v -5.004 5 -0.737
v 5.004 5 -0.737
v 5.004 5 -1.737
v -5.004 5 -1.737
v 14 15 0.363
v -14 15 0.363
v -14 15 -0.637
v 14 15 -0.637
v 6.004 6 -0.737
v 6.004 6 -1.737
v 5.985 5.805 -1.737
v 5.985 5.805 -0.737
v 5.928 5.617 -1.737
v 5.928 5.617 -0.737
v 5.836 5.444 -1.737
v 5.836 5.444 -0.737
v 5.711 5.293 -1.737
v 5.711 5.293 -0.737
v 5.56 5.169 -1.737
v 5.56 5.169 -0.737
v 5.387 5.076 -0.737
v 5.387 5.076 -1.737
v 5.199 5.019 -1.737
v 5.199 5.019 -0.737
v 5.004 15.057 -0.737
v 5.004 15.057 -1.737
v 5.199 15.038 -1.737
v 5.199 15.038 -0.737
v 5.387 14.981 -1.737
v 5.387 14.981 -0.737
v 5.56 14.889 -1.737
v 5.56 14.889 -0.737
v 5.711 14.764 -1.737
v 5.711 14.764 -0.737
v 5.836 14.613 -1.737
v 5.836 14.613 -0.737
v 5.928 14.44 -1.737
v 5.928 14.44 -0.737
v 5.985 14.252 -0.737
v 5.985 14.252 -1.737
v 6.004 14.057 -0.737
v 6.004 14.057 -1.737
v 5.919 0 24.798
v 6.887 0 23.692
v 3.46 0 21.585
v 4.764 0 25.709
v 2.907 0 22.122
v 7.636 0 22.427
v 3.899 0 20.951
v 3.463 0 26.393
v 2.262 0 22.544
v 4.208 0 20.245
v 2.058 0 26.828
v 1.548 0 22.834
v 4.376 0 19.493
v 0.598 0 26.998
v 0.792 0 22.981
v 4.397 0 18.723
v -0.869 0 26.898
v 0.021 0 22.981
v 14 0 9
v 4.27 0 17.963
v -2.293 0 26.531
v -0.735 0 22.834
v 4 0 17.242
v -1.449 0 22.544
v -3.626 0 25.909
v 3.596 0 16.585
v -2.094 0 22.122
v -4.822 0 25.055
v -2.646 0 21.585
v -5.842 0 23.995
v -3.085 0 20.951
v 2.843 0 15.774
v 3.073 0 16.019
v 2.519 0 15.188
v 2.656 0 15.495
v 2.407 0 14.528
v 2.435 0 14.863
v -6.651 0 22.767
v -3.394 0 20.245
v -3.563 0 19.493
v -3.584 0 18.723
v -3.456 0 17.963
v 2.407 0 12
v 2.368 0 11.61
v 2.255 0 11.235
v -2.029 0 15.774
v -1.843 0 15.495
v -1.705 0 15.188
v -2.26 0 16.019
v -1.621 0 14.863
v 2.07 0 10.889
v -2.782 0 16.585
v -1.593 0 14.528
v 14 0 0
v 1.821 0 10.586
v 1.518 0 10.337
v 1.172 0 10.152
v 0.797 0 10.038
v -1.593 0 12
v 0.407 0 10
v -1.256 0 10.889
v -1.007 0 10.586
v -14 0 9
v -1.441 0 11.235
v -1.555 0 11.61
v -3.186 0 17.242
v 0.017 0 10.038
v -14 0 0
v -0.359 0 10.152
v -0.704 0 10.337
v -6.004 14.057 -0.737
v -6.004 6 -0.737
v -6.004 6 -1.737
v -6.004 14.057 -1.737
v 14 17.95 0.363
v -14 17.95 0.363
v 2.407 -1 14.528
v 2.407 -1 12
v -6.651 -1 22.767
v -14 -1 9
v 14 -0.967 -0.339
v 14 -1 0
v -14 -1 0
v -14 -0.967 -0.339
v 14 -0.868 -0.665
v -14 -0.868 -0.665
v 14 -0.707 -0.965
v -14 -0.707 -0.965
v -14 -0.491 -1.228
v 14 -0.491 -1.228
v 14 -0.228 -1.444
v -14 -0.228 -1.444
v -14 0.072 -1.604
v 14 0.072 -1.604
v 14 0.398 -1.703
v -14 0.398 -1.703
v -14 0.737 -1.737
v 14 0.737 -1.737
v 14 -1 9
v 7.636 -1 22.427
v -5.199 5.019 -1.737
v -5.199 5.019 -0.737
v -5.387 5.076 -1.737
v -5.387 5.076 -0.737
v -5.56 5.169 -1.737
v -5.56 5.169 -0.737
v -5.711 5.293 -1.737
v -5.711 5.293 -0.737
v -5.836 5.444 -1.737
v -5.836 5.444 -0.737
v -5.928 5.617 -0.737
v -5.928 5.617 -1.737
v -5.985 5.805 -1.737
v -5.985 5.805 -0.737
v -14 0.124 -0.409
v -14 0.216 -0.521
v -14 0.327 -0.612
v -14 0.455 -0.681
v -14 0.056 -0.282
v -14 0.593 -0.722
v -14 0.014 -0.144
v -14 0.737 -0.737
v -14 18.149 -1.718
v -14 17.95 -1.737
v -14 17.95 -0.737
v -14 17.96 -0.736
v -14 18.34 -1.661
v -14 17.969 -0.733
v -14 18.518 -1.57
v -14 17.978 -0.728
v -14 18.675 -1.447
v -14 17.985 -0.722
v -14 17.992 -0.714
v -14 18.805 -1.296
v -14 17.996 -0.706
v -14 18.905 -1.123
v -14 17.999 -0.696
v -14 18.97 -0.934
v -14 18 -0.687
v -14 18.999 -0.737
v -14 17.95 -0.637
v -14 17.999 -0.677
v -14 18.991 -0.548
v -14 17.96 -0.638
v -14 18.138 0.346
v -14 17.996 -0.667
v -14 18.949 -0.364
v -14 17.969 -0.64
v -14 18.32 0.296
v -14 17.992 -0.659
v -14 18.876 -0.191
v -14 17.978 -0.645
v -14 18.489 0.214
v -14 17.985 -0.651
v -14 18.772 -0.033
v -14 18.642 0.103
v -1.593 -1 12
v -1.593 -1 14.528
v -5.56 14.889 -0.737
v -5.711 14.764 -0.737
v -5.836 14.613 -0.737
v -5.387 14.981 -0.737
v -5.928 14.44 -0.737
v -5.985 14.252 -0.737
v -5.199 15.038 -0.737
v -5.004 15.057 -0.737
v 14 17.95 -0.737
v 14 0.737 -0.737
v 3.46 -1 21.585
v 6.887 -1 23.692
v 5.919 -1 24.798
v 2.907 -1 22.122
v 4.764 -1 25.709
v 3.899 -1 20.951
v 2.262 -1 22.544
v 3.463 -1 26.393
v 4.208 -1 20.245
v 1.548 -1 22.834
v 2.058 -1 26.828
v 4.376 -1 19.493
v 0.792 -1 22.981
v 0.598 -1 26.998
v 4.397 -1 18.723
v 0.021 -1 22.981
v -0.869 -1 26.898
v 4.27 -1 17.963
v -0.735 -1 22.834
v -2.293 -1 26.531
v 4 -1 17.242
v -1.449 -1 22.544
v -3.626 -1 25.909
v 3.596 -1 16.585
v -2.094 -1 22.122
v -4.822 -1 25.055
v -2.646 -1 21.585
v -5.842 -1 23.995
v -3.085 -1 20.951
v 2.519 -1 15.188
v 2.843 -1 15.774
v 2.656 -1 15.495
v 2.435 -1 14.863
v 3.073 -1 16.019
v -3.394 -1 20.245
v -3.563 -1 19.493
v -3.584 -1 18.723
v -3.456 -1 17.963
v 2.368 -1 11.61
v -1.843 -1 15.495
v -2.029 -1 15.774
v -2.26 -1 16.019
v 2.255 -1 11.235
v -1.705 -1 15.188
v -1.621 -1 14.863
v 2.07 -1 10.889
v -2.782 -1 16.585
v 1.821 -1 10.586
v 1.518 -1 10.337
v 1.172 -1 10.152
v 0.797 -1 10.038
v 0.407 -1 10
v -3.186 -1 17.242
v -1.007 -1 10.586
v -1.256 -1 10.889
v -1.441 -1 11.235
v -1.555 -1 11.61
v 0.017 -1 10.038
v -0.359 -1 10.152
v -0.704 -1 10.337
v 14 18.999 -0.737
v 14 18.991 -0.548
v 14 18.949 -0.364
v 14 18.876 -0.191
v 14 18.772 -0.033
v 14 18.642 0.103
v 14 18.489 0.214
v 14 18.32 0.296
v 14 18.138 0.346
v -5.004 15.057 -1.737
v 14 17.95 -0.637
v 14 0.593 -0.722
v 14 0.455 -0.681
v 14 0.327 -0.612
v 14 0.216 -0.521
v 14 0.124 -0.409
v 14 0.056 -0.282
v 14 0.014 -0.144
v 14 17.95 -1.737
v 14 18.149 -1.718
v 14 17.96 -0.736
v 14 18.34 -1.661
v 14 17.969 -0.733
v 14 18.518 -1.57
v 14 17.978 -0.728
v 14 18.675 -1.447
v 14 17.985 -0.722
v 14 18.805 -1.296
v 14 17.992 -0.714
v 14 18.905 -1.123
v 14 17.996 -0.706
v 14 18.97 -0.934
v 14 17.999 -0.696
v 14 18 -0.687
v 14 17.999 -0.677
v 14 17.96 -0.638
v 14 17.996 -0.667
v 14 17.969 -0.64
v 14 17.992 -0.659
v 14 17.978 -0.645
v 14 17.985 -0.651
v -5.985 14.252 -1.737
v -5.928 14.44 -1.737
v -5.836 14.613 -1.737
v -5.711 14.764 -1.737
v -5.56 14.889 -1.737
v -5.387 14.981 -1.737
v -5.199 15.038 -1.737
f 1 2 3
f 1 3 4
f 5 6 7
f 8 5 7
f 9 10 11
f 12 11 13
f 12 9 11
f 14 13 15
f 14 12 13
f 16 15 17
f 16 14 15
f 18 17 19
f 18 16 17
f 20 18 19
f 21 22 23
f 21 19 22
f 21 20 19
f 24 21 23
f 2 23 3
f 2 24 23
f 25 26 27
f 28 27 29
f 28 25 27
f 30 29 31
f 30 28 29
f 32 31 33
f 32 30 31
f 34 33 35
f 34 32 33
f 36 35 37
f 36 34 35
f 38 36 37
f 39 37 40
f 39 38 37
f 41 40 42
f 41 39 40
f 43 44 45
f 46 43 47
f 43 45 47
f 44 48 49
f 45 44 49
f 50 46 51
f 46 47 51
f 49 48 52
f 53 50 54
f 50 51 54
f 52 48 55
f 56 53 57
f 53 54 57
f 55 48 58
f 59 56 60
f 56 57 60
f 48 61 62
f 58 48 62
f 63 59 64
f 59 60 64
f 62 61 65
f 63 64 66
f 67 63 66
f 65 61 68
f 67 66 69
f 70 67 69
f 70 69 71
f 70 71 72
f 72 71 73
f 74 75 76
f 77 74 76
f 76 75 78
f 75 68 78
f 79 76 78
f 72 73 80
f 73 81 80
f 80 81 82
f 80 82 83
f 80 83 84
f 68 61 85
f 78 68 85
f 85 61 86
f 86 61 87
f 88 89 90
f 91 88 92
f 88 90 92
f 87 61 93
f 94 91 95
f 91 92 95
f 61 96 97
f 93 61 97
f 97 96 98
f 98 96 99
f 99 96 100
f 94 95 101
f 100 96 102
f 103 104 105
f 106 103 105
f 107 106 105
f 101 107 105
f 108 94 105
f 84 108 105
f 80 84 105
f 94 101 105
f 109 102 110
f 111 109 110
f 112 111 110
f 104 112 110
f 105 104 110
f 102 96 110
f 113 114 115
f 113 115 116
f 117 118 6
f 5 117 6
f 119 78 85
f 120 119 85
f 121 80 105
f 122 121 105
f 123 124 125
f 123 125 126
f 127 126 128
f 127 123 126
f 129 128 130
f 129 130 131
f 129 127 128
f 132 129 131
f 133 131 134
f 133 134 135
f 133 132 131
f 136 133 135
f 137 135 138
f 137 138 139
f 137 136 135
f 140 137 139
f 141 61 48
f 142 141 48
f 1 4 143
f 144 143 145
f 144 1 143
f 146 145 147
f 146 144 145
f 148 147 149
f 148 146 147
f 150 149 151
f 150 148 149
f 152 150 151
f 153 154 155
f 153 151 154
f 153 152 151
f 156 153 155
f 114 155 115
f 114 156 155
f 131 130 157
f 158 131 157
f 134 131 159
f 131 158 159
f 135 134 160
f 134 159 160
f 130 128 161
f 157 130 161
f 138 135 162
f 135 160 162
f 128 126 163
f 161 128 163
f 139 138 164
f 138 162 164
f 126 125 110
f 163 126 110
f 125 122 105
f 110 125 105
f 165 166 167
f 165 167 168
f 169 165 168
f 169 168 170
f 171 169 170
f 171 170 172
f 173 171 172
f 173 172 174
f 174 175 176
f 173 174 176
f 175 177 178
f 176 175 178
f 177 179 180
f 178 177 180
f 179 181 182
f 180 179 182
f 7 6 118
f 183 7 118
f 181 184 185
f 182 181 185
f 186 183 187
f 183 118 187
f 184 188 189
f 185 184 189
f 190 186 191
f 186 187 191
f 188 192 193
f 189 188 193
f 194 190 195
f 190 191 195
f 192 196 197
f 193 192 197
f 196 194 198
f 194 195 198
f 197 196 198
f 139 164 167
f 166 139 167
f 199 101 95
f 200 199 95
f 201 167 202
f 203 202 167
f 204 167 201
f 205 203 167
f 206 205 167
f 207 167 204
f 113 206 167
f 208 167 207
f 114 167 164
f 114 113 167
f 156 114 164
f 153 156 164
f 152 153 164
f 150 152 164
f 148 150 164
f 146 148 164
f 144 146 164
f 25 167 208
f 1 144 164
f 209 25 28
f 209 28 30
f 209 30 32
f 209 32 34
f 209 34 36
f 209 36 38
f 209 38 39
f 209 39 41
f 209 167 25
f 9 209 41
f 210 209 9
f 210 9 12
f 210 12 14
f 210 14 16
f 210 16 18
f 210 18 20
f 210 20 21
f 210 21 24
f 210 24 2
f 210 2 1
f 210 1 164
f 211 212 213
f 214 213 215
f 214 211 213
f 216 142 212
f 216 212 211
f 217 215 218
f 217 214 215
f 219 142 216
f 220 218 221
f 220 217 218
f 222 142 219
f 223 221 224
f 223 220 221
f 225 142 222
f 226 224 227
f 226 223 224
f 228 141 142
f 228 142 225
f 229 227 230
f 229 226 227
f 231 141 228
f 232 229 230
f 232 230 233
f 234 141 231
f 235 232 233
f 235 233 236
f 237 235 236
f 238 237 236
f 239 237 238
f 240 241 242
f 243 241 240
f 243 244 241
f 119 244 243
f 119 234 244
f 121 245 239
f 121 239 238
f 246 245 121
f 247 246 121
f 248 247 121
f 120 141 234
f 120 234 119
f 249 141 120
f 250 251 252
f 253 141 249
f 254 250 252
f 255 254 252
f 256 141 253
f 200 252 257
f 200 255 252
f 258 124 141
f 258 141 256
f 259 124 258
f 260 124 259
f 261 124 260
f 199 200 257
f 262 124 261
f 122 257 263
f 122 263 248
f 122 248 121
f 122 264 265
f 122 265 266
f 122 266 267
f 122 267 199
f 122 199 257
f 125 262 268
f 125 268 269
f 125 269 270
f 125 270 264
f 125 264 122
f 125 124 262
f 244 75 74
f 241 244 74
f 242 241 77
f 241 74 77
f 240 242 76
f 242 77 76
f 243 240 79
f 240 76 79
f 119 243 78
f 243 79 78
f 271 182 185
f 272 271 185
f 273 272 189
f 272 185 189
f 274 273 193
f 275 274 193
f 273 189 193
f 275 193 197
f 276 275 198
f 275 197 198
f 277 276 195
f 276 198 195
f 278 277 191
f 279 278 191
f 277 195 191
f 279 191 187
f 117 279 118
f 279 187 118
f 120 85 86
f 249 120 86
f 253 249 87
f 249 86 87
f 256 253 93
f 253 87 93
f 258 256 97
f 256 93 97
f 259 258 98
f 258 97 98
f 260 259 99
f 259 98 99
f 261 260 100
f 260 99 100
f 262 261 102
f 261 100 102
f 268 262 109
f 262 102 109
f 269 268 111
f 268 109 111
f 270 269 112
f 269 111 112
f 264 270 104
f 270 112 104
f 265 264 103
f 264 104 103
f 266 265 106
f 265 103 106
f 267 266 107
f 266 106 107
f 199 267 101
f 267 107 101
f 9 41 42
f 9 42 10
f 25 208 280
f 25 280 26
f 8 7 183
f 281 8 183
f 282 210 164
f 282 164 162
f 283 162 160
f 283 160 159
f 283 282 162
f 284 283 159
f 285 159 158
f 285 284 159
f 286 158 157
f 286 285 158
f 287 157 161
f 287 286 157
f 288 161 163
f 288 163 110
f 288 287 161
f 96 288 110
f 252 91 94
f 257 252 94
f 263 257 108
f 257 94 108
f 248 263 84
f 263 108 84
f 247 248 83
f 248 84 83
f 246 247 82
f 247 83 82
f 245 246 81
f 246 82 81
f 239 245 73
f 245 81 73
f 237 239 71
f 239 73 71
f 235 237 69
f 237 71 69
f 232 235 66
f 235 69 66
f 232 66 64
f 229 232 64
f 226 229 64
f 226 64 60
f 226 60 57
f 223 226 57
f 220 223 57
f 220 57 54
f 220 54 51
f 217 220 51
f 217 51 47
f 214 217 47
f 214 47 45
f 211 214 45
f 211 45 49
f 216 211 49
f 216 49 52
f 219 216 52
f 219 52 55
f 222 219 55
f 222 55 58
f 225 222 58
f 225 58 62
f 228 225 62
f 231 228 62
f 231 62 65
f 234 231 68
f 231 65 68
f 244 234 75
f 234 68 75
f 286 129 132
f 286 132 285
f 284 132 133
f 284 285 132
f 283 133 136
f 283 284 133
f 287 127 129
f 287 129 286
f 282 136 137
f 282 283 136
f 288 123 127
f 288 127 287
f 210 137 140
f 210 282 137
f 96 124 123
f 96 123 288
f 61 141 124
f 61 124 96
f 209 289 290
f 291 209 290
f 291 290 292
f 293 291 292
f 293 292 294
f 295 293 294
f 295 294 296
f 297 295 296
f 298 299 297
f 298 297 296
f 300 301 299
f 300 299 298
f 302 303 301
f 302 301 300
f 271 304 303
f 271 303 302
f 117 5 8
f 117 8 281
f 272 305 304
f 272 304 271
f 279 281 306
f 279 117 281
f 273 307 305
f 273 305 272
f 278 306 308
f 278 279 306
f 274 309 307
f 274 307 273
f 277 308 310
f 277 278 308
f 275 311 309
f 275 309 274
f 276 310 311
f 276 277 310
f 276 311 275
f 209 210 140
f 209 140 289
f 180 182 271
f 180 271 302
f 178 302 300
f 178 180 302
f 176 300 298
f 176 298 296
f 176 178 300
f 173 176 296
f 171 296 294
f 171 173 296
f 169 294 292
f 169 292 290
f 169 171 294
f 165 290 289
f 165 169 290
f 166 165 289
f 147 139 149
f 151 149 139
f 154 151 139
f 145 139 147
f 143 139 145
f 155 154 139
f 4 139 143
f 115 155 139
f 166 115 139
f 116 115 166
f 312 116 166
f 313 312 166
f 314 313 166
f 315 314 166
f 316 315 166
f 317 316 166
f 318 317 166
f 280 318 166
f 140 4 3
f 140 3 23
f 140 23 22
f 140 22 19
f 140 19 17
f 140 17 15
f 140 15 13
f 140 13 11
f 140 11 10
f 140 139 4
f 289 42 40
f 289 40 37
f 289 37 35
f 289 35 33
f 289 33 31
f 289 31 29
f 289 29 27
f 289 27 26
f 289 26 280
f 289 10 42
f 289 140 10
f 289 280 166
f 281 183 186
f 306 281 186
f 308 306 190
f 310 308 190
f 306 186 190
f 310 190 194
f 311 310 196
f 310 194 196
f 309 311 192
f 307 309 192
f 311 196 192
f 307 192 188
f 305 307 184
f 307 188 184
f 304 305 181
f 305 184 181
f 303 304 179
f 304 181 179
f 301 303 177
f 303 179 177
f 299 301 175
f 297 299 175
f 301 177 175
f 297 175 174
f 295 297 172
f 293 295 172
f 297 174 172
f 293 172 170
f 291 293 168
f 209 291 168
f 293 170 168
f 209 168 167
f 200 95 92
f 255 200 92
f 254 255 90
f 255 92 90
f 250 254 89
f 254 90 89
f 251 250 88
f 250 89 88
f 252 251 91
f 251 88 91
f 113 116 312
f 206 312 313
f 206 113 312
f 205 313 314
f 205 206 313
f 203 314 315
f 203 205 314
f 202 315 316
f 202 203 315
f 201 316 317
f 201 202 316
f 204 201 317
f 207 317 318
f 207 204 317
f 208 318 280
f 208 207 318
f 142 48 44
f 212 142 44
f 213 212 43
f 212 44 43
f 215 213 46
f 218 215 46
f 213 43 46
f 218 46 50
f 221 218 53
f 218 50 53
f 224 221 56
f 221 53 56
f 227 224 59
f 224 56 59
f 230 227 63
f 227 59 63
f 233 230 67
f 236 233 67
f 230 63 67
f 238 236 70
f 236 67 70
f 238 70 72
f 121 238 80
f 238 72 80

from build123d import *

# Parameters (mm, degrees)
BASE_FLANGE1_DEPTH = 1
EDGE_FLANGE1_DEPTH = 28
HEM1_START         = -14
HEM1_DEPTH         = 28
HEM1_2_DEPTH       = 28
CUT_EXTRUDE1_DEPTH = 10
CUT_EXTRUDE3_DEPTH = 10


# Read off the part's stored shape, not the designer's step: Hem1
# Sheet-metal steps are written as plain solids
with BuildPart() as part:
    # Sketch1 → Base-Flange1 (new body)
    with BuildSketch(Plane(origin=(0, 0, 0), x_dir=(1, 0, 0), z_dir=(0, 1, 0))):
        with BuildLine():
            Line((-14, 0), (14, 0))
            Line((14, 0), (14, -9))
            Line((14, -9), (7.635806501, -22.426557457))
            ThreePointArc((7.635806501, -22.426557457), (0.597605148, -26.997723985), (-6.650589662, -22.767415048))
            Line((-6.650589662, -22.767415048), (-14, -9))
            Line((-14, -9), (-14, 0))
        make_face()
    extrude(amount=-BASE_FLANGE1_DEPTH)

    # Edge-Flange1 section (across the edge) → Edge-Flange1 (add)
    with BuildSketch(Plane(origin=(14, 0, -0.7366), x_dir=(0, 0, 1), z_dir=(-1, 0, 0))):
        with BuildLine():
            Line((-1, 0.7366), (-1, 19))
            Line((-1, 19), (0, 19))
            Line((0, 19), (0, 0.7366))
            ThreePointArc((0, 0.7366), (0.215745145, 0.215745145), (0.7366, 0))
            Line((0.7366, 0), (0.7366, -1))
            ThreePointArc((0.7366, -1), (-0.491361636, -0.491361636), (-1, 0.7366))
        make_face()
    extrude(amount=EDGE_FLANGE1_DEPTH)

    # Hem1 outline → Hem1 (cut)
    with BuildSketch(Plane.YZ.offset(HEM1_START)):
        with BuildLine():
            Line((19, -0.7366), (18.998808848, -0.7366))
            ThreePointArc((18.998808848, -0.7366), (18.674568837, -1.446534208), (17.95, -1.7366))
            Line((17.95, -1.7366), (19, -1.7366))
            Line((19, -1.7366), (19, -0.7366))
        make_face()
    extrude(amount=HEM1_DEPTH, mode=Mode.SUBTRACT)

    # Hem1 2 outline → Hem1 2 (add)
    with BuildSketch(Plane.YZ.offset(HEM1_START)):
        with BuildLine():
            Line((15, 0.3634), (15, -0.6366))
            Line((15, -0.6366), (17.95, -0.6366))
            ThreePointArc((17.95, -0.6366), (18, -0.6866), (17.95, -0.7366))
            Line((17.95, -0.7366), (18.998808848, -0.7366))
            ThreePointArc((18.998808848, -0.7366), (18.709934208, 0.037968837), (17.95, 0.3634))
            Line((17.95, 0.3634), (15, 0.3634))
        make_face()
    extrude(amount=HEM1_2_DEPTH)

    # Sketch15 → Cut-Extrude1 (cut)
    with BuildSketch(Plane.XY.offset(-0.7366)):
        with BuildLine():
            Line((-5.004090335, 15.057117645), (5.004090335, 15.057117645))
            ThreePointArc((5.004090335, 15.057117645), (5.711197117, 14.764224427), (6.004090335, 14.057117645))
            Line((6.004090335, 14.057117645), (6.004090335, 6))
            ThreePointArc((6.004090335, 6), (5.711197117, 5.292893219), (5.004090335, 5))
            Line((5.004090335, 5), (-5.004090335, 5))
            ThreePointArc((-5.004090335, 5), (-5.711197117, 5.292893219), (-6.004090335, 6))
            Line((-6.004090335, 6), (-6.004090335, 14.057117645))
            ThreePointArc((-6.004090335, 14.057117645), (-5.711197117, 14.764224427), (-5.004090335, 15.057117645))
        make_face()
    extrude(amount=-CUT_EXTRUDE1_DEPTH, mode=Mode.SUBTRACT)

    # Sketch16 → Cut-Extrude3 (cut)
    with BuildSketch(Plane(origin=(0, 0, 0), x_dir=(1, 0, 0), z_dir=(0, 1, 0))):
        with BuildLine():
            Line((-1.593211689, -12), (-1.593211689, -14.527864045))
            ThreePointArc((-1.593211689, -14.527864045), (-1.767469831, -15.344360626), (-2.259878356, -16.01857603))
            ThreePointArc((-2.259878356, -16.01857603), (0.406788311, -23), (3.073454977, -16.01857603))
            ThreePointArc((3.073454977, -16.01857603), (2.581046452, -15.344360626), (2.406788311, -14.527864045))
            Line((2.406788311, -14.527864045), (2.406788311, -12))
            ThreePointArc((2.406788311, -12), (0.406788311, -10), (-1.593211689, -12))
        make_face()
    extrude(amount=-CUT_EXTRUDE3_DEPTH, mode=Mode.SUBTRACT)


solid = part.part
